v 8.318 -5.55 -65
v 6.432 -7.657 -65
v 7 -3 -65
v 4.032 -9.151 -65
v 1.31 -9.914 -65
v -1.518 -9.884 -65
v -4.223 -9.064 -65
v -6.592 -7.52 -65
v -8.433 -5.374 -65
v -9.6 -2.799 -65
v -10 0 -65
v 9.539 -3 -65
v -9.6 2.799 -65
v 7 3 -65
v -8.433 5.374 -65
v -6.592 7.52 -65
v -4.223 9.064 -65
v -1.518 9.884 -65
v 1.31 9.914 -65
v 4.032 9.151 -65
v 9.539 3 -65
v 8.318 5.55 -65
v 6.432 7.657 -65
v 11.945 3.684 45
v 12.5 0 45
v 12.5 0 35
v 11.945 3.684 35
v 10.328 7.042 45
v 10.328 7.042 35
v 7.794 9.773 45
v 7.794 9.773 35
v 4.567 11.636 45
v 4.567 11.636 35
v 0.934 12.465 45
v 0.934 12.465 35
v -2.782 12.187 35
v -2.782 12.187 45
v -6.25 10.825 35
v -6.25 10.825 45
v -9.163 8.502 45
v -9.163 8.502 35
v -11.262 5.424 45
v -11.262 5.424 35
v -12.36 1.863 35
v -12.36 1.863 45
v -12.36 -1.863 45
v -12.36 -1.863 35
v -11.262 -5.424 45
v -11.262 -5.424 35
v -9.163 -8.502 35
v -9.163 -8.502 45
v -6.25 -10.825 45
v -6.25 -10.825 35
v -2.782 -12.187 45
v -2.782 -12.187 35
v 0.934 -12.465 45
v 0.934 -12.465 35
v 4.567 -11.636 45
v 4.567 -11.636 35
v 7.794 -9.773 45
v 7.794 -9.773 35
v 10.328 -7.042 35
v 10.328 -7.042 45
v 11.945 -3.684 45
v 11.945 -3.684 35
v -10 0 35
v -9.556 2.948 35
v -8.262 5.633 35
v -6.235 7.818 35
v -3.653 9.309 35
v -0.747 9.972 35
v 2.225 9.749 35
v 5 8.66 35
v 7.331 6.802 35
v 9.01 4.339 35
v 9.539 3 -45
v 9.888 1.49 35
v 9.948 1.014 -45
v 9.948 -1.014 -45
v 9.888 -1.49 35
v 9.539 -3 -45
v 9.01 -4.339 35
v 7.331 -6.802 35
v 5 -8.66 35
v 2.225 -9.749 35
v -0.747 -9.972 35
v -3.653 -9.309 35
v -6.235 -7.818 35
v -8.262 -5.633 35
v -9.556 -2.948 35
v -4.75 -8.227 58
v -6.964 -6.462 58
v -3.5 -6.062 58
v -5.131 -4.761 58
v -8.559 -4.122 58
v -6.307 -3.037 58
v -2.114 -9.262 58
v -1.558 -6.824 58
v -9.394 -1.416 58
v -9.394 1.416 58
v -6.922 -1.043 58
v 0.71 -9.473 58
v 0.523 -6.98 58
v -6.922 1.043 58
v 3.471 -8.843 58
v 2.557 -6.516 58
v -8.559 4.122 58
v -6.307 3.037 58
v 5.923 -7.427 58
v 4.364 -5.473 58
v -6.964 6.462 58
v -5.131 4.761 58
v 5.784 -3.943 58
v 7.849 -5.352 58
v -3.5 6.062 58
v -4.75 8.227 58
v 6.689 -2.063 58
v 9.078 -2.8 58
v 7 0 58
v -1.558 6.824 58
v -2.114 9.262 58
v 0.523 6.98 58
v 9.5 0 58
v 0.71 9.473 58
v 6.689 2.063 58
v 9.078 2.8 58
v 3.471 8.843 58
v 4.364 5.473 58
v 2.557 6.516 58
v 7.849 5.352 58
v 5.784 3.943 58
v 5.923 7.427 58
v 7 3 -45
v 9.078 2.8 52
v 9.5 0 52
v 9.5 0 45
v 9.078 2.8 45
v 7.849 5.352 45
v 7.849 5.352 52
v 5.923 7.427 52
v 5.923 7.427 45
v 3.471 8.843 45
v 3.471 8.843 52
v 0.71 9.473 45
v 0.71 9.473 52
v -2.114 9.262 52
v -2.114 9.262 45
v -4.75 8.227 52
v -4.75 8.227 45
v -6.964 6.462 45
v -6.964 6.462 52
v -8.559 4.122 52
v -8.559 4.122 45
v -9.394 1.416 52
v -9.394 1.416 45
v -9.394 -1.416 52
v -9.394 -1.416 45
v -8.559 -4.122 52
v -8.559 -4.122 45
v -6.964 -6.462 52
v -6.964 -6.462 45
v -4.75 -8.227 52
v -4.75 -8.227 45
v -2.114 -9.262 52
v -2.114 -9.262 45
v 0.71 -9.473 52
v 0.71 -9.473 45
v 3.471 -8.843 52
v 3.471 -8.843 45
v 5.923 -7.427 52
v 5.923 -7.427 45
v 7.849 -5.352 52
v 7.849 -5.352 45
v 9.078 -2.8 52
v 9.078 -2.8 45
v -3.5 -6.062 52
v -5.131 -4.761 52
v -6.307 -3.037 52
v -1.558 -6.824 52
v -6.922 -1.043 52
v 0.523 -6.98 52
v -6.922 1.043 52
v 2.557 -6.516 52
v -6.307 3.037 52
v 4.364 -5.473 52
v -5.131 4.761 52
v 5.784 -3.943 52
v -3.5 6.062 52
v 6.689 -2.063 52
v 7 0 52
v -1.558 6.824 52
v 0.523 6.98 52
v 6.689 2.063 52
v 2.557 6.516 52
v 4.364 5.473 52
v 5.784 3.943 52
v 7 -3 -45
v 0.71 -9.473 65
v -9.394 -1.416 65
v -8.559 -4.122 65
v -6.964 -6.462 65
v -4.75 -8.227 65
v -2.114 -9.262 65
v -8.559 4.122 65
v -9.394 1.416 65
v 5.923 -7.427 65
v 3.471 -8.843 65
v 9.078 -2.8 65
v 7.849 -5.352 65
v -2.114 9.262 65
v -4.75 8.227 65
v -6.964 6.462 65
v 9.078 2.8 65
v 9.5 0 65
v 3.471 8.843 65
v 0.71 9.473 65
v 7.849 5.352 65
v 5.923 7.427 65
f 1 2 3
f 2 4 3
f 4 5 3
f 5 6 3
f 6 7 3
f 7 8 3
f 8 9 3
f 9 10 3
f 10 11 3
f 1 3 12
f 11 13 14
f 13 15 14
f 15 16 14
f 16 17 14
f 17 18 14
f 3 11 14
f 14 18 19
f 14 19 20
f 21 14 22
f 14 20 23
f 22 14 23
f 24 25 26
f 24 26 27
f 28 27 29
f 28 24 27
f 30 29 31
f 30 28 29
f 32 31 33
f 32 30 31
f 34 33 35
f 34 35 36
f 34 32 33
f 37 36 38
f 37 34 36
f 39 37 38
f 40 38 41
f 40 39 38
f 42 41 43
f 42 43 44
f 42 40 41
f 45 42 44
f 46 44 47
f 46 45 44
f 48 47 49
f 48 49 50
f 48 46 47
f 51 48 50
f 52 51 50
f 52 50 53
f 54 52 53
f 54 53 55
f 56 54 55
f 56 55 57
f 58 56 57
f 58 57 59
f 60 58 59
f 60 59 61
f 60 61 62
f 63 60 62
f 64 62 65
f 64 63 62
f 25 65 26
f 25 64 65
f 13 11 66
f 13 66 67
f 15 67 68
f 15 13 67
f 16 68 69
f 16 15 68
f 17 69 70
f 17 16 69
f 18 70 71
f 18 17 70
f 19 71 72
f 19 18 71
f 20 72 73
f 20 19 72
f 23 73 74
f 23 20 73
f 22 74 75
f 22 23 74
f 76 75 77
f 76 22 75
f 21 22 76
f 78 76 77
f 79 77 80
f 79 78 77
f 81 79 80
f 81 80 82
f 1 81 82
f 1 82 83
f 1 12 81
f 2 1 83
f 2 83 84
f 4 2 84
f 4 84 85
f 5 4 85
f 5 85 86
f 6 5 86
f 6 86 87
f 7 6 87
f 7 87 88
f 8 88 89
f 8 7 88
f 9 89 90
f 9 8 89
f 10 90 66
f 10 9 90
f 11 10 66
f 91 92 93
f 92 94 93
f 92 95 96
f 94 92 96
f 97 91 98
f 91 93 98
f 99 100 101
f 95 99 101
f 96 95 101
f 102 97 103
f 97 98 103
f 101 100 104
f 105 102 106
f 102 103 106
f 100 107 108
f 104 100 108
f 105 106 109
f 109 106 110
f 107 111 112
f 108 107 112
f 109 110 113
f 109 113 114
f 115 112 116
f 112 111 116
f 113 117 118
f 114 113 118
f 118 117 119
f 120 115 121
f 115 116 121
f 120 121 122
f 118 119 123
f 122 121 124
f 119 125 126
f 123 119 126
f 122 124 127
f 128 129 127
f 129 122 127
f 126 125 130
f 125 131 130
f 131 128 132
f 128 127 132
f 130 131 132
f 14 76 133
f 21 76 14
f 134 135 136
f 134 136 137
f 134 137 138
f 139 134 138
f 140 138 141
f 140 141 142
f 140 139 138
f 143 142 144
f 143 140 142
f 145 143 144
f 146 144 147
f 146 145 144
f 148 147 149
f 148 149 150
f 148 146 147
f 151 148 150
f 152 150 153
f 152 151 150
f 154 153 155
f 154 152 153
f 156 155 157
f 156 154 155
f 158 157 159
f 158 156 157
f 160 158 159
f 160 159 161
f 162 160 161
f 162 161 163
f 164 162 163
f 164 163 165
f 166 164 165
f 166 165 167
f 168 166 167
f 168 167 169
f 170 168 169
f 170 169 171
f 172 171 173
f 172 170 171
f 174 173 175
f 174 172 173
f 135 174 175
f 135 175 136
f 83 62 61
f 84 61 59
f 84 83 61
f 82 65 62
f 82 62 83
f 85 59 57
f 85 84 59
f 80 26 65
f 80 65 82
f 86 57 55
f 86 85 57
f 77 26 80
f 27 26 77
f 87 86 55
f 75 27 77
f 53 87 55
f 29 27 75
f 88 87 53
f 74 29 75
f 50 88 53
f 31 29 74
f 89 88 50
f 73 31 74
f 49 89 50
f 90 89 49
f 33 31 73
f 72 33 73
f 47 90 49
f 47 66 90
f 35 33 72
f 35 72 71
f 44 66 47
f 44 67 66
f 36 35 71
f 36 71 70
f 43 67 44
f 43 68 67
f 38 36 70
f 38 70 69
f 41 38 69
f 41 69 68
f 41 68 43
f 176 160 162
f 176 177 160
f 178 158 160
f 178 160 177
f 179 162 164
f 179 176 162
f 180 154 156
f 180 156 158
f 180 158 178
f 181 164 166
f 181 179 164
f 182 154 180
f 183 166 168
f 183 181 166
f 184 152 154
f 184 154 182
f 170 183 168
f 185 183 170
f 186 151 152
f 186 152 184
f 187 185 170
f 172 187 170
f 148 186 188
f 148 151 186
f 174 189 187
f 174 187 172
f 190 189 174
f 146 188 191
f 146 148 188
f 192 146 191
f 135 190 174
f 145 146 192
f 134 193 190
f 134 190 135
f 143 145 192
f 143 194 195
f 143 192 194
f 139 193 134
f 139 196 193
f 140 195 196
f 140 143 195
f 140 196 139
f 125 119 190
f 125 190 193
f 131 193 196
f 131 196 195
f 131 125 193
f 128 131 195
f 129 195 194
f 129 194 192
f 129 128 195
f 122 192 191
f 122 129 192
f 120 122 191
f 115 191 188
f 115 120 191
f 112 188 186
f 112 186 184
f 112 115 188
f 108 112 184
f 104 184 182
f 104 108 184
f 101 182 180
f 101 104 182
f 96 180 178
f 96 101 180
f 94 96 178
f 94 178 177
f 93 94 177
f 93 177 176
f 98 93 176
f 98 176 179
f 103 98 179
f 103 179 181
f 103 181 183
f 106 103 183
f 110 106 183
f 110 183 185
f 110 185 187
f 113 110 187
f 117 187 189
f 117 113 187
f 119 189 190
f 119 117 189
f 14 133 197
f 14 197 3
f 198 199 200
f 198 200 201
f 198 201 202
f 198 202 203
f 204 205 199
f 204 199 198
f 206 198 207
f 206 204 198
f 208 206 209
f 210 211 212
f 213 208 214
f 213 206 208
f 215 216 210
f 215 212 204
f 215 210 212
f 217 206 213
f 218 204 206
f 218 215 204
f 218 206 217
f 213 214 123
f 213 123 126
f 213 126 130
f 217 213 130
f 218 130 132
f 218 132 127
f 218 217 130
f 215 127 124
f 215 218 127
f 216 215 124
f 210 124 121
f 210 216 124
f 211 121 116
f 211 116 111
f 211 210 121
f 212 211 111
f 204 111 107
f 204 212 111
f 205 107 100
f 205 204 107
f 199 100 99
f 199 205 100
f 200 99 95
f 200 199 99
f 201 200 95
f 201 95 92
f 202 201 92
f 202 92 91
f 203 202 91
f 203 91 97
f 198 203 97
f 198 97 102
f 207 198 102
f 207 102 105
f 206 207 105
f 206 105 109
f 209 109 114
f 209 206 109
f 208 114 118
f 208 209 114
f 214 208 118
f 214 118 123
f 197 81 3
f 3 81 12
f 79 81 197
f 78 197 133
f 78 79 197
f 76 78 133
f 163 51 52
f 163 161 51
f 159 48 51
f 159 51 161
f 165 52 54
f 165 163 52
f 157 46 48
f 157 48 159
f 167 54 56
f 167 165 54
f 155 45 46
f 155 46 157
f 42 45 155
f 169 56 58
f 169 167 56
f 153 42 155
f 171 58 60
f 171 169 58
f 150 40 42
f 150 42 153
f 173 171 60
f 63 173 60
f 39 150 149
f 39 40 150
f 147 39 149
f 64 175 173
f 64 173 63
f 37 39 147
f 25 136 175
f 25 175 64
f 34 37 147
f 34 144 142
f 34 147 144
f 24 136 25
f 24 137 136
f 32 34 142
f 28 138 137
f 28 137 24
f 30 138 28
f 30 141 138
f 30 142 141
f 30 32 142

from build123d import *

# Parameters (mm, degrees)
IZIM1_R                     = 12.5
Y_KSEKLIK_EKSTR_ZYON1_DEPTH = 65
IZIM2_R                     = 12.5
IZIM2_R_2                   = 10
KES_EKSTR_ZYON1_DEPTH       = 100
IZIM3_W                     = 20
IZIM3_H                     = 6
KES_EKSTR_ZYON2_DEPTH       = 3
IZIM4_R                     = 12.5
IZIM4_R_2                   = 9.5
KES_EKSTR_ZYON3_DEPTH       = 7
IZIM5_R                     = 12.5
IZIM5_R_2                   = 7
KES_EKSTR_ZYON4_DEPTH       = 6
IZIM6_R                     = 12.5
IZIM6_R_2                   = 9.5
KES_EKSTR_ZYON5_DEPTH       = 7


with BuildPart() as part:
    # Çizim1 → Yükseklik-Ekstrüzyon1 (new body, symmetric)
    with BuildSketch(Plane.XY):
        Circle(IZIM1_R)
    extrude(amount=Y_KSEKLIK_EKSTR_ZYON1_DEPTH, both=True)

    # Çizim2 → Kes-Ekstrüzyon1 (cut)
    with BuildSketch(Plane(origin=(0, 0, -65), x_dir=(-1, 0, 0), z_dir=(0, 0, -1))):
        Circle(IZIM2_R)
        Circle(IZIM2_R_2, mode=Mode.SUBTRACT)
    extrude(amount=-KES_EKSTR_ZYON1_DEPTH, mode=Mode.SUBTRACT)

    # Çizim3 → Kes-Ekstrüzyon2 (cut)
    with BuildSketch(Plane(origin=(10, 0, 0), x_dir=(0, 0, -1), z_dir=(1, 0, 0))):
        with Locations((55, 0)):
            Rectangle(IZIM3_W, IZIM3_H)
    extrude(amount=-KES_EKSTR_ZYON2_DEPTH, mode=Mode.SUBTRACT)

    # Çizim4 → Kes-Ekstrüzyon3 (cut)
    with BuildSketch(Plane.XY.offset(65)):
        Circle(IZIM4_R)
        Circle(IZIM4_R_2, mode=Mode.SUBTRACT)
    extrude(amount=-KES_EKSTR_ZYON3_DEPTH, mode=Mode.SUBTRACT)

    # Çizim5 → Kes-Ekstrüzyon4 (cut)
    with BuildSketch(Plane.XY.offset(58)):
        Circle(IZIM5_R)
        Circle(IZIM5_R_2, mode=Mode.SUBTRACT)
    extrude(amount=-KES_EKSTR_ZYON4_DEPTH, mode=Mode.SUBTRACT)

    # Çizim6 → Kes-Ekstrüzyon5 (cut)
    with BuildSketch(Plane.XY.offset(52)):
        Circle(IZIM6_R)
        Circle(IZIM6_R_2, mode=Mode.SUBTRACT)
    extrude(amount=-KES_EKSTR_ZYON5_DEPTH, mode=Mode.SUBTRACT)


solid = part.part
